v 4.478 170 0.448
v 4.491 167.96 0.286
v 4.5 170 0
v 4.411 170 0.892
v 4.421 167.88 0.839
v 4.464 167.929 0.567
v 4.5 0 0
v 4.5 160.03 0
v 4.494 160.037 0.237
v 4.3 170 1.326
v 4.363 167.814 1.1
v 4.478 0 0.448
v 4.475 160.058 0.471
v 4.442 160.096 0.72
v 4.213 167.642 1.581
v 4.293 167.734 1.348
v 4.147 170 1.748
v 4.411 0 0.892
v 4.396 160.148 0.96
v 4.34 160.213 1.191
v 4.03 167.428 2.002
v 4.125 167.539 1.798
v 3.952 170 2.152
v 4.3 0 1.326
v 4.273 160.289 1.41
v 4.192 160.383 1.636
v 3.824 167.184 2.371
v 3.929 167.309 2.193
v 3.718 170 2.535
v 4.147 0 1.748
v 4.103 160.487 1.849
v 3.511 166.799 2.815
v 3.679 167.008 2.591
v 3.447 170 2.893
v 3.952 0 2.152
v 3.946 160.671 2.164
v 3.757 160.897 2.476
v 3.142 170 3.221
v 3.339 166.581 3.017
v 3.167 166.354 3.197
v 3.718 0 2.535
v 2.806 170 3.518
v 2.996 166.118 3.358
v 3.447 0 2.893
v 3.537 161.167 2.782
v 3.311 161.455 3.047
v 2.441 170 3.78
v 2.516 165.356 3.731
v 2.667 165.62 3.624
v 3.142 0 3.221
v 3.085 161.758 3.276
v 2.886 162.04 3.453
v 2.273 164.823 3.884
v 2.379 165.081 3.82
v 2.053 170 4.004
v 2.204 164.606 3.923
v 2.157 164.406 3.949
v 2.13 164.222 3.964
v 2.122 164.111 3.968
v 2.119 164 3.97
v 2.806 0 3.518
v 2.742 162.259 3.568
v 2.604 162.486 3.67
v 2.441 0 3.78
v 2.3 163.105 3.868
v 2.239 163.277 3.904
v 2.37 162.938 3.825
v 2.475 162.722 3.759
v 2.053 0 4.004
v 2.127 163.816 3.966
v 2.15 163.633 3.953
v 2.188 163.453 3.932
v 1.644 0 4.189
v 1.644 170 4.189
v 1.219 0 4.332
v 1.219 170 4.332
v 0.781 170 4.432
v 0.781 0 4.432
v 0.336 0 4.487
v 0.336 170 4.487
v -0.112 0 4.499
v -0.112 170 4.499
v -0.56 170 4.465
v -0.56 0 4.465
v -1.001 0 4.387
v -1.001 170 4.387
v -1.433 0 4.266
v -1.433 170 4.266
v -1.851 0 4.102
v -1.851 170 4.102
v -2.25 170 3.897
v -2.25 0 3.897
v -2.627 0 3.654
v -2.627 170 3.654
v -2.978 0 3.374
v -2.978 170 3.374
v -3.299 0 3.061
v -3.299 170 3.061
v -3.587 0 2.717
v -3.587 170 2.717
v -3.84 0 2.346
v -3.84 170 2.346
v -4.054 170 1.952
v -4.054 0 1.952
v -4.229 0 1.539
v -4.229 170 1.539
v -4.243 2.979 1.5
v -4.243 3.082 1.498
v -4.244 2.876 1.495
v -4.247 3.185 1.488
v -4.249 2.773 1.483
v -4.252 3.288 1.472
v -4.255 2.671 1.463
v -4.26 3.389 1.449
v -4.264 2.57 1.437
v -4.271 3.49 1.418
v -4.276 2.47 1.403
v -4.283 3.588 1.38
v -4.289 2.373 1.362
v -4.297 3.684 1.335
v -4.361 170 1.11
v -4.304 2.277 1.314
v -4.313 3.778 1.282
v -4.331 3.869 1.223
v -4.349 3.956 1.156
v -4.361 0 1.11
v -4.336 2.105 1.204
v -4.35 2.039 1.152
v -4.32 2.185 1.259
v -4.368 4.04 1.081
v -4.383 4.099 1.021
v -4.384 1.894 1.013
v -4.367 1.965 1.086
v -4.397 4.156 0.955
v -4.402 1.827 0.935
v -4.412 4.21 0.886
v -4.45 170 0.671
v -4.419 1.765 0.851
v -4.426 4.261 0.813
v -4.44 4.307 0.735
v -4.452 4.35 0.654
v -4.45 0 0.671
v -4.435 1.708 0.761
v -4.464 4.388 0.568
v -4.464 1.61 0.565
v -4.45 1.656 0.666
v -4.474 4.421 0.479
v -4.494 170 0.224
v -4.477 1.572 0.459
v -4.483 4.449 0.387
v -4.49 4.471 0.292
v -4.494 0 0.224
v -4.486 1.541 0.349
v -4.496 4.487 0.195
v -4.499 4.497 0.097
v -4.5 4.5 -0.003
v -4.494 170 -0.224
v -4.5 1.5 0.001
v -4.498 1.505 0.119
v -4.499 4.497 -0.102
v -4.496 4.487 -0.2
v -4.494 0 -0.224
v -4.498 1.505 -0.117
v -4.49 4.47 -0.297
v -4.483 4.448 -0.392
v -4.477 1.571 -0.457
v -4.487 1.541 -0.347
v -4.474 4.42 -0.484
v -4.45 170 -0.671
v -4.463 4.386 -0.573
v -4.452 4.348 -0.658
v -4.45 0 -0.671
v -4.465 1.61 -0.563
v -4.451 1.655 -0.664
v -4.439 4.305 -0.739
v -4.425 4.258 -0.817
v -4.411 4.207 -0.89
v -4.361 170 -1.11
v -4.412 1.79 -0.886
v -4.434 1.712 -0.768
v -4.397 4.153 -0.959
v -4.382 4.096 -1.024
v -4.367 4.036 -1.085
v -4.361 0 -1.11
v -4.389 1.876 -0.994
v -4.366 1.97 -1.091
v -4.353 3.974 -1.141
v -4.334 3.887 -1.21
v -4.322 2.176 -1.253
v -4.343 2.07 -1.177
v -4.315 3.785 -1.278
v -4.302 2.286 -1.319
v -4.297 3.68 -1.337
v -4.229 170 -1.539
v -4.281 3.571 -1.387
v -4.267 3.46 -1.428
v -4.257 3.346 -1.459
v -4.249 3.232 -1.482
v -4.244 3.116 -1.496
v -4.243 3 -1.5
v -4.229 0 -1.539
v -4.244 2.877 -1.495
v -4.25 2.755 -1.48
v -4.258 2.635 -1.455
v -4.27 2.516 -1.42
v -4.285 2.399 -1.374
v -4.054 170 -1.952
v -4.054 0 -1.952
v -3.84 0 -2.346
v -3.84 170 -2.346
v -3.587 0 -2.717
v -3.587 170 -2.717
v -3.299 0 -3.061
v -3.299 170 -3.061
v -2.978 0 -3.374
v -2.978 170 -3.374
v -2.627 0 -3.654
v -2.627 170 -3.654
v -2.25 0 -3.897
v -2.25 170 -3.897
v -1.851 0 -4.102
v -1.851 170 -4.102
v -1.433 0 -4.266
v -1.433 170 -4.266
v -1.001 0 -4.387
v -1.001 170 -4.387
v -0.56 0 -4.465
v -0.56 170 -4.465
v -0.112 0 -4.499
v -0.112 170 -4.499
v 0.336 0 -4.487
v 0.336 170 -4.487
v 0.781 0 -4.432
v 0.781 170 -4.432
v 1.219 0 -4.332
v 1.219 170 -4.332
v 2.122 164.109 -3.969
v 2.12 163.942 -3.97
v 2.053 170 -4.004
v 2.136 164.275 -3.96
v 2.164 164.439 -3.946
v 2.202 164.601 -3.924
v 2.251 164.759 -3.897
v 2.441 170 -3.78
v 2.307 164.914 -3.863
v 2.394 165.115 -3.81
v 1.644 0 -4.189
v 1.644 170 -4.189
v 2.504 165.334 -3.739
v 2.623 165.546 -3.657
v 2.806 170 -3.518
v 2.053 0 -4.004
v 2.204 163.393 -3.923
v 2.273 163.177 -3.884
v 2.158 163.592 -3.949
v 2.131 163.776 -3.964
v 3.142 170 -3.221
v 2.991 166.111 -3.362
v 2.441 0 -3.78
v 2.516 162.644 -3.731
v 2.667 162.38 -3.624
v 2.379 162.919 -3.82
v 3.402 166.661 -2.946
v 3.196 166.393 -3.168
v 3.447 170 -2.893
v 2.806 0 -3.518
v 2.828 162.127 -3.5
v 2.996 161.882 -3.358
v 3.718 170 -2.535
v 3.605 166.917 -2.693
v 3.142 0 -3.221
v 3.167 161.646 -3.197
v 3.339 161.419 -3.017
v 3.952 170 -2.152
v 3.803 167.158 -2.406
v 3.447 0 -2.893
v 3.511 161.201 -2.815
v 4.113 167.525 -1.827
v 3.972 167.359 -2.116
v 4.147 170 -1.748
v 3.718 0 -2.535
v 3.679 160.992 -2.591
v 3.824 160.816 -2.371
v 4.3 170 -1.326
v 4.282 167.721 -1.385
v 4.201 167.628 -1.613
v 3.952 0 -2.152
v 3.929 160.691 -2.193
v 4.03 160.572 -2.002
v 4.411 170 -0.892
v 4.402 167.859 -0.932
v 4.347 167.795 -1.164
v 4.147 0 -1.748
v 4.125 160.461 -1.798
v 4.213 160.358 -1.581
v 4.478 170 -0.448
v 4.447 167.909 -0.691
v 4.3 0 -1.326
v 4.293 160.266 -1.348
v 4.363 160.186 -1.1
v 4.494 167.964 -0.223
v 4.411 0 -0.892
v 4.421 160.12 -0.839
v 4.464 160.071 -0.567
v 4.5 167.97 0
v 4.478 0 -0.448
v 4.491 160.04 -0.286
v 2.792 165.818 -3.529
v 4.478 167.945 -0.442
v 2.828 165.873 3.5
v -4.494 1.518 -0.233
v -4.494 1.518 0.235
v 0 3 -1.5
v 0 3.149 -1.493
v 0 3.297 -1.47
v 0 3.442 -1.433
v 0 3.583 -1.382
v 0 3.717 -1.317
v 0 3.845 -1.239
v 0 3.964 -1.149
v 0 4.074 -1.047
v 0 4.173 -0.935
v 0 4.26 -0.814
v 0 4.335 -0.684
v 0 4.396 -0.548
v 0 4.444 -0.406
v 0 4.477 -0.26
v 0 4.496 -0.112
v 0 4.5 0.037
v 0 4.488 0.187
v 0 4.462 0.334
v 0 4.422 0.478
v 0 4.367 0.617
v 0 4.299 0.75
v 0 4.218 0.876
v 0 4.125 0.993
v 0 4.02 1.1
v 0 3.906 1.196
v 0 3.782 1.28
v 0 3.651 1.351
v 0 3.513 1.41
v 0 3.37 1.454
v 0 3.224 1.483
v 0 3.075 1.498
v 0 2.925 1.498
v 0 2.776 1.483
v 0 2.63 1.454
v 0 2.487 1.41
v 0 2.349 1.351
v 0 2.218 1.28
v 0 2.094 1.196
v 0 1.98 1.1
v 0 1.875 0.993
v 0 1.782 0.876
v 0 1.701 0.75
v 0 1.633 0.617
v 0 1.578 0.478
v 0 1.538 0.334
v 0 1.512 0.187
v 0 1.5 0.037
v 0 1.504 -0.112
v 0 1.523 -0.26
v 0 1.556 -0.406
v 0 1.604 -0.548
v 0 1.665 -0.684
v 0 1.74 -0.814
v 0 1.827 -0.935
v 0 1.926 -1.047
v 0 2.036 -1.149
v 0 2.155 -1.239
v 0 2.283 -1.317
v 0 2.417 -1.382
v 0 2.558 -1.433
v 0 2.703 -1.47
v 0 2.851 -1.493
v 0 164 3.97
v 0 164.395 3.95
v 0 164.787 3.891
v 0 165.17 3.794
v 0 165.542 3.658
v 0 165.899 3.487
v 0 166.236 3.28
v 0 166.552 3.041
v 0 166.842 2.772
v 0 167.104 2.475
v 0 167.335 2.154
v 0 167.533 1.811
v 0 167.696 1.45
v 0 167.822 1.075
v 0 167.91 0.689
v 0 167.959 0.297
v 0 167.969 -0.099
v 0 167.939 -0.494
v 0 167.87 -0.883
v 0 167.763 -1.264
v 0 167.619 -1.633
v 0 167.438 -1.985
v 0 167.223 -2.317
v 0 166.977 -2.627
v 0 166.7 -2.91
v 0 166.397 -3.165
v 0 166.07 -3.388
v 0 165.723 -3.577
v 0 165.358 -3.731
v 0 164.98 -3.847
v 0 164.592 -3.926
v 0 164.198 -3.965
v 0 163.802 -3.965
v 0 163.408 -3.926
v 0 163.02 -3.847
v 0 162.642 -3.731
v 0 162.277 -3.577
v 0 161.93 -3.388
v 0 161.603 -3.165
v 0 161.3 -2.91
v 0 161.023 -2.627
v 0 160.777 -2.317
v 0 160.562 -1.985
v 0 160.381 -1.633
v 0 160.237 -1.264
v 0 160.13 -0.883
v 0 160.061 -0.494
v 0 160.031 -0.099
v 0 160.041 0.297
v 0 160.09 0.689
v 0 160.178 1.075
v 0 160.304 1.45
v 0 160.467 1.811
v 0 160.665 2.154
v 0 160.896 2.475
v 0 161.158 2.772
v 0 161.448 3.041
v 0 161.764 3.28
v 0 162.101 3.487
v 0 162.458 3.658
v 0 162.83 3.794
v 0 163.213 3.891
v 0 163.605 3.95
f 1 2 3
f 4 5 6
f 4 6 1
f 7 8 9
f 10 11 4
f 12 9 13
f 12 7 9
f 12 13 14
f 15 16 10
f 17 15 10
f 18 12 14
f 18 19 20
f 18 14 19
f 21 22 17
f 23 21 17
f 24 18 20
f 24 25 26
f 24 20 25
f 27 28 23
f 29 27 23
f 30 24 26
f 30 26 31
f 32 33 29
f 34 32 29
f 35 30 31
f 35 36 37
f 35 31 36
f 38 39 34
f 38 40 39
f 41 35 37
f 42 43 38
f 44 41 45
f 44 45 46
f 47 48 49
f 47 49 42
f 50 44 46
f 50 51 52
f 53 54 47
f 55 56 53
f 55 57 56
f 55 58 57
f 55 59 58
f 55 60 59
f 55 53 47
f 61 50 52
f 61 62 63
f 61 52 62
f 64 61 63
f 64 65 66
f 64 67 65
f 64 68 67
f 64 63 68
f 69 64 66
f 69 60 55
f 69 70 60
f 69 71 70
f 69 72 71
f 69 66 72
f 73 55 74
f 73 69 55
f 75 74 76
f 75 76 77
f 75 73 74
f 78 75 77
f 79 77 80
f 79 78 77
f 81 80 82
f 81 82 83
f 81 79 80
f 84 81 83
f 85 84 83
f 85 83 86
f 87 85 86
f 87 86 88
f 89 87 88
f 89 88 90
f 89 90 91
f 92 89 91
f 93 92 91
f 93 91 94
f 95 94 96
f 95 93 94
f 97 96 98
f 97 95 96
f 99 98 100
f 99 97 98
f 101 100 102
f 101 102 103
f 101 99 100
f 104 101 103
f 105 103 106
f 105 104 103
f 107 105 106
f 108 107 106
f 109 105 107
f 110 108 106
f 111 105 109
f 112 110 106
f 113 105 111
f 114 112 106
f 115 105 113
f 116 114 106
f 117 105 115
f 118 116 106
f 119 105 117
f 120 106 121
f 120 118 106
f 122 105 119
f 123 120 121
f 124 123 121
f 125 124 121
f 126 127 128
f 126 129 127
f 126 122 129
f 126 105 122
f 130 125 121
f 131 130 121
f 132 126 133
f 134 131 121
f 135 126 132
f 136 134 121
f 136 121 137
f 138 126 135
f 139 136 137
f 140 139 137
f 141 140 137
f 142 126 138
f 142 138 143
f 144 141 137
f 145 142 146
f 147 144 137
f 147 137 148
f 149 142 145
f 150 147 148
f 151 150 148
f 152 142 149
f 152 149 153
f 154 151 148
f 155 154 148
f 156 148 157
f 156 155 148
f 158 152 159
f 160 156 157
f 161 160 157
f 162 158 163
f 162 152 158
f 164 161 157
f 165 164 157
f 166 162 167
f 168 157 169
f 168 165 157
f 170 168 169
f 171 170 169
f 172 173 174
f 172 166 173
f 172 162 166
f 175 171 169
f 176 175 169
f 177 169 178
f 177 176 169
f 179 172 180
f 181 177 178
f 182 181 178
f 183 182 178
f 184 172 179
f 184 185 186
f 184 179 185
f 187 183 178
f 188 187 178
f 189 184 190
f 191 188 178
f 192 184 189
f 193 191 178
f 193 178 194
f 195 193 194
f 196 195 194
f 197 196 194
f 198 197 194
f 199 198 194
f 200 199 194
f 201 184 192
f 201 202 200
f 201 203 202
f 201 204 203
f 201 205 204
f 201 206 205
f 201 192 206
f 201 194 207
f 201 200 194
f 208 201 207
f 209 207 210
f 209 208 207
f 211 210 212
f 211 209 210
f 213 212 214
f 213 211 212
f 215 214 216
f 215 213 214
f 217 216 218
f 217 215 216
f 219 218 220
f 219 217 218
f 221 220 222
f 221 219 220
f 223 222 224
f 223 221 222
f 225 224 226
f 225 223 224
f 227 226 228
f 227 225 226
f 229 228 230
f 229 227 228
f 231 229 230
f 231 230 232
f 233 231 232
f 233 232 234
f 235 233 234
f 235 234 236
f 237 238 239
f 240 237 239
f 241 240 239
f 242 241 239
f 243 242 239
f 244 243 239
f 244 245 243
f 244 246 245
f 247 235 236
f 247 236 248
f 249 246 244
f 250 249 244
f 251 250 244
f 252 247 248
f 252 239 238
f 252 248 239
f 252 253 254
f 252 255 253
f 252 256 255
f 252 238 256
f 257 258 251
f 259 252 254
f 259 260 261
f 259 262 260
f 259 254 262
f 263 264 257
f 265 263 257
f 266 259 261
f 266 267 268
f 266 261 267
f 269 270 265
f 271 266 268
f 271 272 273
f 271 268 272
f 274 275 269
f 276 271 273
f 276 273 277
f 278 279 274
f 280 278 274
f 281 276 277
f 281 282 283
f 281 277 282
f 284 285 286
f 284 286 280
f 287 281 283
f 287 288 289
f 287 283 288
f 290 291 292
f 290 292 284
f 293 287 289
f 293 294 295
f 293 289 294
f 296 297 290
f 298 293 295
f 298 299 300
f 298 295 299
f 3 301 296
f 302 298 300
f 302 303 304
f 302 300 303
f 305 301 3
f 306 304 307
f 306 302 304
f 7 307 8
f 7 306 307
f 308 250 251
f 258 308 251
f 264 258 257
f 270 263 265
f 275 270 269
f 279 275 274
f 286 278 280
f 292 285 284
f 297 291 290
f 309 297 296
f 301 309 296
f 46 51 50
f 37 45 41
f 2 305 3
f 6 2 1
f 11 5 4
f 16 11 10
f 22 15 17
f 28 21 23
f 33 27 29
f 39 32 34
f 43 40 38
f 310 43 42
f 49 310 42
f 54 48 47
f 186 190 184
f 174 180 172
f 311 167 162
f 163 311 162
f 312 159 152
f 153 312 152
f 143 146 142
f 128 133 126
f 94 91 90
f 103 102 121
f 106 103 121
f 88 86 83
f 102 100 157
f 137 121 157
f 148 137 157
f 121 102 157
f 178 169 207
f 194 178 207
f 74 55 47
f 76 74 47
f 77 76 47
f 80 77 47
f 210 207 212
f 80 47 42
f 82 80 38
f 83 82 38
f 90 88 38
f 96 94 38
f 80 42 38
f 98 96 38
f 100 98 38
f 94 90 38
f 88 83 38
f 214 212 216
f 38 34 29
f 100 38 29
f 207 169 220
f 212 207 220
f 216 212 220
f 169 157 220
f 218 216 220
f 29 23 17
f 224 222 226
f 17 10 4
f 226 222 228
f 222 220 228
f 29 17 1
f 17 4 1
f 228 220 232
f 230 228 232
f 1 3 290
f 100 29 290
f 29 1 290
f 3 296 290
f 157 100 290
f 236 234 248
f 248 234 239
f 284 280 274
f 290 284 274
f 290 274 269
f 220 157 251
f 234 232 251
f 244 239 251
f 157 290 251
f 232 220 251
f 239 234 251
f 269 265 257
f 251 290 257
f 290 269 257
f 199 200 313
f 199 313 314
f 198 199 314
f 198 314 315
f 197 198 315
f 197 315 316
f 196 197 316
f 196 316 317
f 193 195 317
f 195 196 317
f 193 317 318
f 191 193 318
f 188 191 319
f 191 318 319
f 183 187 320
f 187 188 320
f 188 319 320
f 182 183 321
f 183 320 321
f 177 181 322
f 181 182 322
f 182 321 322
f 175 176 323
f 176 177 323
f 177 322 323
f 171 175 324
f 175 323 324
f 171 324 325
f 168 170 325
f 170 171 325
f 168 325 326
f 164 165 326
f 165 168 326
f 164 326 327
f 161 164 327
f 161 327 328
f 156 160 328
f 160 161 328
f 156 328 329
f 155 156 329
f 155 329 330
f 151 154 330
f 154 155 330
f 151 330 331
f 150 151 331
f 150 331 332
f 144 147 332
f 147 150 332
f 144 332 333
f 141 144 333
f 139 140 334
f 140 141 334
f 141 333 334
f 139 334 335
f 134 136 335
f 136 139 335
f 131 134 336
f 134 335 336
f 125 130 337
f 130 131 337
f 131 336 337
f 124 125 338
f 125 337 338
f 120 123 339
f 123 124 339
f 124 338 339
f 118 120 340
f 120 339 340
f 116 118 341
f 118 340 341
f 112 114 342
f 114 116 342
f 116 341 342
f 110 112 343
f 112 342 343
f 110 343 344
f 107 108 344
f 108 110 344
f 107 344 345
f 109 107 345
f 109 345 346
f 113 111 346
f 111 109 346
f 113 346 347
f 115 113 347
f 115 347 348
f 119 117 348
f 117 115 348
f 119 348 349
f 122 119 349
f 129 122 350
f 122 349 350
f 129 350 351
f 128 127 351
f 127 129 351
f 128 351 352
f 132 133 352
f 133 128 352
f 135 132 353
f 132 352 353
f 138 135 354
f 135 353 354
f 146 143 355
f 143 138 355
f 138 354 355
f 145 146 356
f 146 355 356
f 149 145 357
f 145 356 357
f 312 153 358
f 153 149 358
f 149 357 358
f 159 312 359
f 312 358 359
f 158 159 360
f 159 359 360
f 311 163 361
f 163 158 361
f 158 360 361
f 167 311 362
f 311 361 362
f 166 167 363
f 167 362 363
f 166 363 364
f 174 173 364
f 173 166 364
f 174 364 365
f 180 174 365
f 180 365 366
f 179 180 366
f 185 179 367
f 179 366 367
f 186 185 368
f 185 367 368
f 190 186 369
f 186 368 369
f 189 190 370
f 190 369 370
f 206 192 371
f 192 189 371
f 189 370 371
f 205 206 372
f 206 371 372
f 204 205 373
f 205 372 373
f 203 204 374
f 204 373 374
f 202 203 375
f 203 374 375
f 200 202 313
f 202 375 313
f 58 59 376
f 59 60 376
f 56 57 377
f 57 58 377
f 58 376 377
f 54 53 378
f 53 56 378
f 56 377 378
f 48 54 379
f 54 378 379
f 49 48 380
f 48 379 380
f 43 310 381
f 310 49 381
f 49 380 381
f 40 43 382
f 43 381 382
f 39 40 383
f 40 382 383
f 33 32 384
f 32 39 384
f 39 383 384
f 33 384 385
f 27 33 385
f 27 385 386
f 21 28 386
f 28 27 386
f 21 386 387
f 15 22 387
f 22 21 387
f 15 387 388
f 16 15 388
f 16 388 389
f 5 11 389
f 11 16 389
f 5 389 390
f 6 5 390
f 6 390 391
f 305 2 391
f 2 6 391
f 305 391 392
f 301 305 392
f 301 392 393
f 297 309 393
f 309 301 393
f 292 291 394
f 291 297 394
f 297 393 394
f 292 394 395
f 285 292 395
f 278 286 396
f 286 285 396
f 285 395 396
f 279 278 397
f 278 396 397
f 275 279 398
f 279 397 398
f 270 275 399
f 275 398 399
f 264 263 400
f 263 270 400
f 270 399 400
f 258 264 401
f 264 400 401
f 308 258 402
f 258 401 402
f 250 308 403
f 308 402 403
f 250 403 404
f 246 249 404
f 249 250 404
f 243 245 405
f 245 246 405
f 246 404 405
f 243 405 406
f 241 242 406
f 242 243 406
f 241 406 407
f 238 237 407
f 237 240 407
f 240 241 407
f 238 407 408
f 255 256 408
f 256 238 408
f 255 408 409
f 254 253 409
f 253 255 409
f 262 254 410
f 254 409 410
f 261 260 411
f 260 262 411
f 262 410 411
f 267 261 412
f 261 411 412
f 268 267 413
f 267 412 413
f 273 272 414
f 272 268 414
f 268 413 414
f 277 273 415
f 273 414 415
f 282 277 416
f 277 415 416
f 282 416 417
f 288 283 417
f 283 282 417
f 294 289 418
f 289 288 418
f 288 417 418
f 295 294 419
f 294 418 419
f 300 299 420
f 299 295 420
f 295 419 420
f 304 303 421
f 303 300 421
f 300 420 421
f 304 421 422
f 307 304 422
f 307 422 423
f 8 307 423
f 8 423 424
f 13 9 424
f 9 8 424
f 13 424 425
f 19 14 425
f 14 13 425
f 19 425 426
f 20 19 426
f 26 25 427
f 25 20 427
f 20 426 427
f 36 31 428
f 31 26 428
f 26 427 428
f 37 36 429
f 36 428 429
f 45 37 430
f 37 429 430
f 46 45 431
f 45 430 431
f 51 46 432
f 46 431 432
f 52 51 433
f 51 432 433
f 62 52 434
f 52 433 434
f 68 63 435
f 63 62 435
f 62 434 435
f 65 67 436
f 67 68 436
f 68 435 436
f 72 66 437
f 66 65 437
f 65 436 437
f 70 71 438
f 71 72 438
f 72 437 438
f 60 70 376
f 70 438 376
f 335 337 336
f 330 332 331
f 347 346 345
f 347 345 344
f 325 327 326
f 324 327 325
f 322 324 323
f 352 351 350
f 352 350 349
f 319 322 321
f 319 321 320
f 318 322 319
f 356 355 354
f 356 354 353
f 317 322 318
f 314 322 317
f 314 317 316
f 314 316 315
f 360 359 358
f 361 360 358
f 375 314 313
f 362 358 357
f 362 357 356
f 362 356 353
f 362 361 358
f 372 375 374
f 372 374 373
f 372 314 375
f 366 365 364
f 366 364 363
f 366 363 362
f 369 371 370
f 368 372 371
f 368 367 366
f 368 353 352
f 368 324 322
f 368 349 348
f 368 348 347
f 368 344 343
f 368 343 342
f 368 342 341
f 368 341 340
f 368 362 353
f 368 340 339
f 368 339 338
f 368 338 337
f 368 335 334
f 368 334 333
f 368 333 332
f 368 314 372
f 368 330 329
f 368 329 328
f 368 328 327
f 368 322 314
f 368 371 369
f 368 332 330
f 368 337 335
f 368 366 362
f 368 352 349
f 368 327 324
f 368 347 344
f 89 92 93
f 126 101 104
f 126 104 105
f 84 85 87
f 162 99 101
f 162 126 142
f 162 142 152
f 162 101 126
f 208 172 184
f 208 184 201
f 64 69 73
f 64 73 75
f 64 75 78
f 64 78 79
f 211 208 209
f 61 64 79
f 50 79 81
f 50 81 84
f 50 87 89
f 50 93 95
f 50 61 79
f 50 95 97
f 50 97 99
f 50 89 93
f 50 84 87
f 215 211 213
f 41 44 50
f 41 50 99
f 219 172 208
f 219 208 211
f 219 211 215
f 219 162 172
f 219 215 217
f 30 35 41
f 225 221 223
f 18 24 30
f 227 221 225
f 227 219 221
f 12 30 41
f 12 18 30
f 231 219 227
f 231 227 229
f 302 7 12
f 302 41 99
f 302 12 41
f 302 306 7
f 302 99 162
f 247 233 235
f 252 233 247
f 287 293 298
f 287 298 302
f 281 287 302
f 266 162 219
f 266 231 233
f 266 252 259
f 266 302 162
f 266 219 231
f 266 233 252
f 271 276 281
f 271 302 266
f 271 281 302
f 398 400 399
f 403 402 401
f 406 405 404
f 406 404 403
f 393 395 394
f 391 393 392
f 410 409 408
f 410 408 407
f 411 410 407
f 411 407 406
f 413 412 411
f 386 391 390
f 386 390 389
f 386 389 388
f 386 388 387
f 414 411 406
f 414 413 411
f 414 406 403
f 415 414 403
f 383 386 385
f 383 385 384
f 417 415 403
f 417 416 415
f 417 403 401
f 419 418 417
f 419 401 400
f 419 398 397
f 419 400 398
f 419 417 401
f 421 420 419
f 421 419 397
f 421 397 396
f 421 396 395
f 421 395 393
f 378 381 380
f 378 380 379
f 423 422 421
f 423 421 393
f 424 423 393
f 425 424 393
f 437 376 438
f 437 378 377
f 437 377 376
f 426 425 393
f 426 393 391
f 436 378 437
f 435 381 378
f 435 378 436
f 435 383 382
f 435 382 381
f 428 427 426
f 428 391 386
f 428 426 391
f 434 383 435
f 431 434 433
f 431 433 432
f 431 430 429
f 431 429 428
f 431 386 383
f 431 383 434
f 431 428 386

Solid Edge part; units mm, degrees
sketch "Sketch1" plane through (0, 0, 0) normal (0, -1, 0) x (1, 0, 0)
  circle A0 centre (0, 0) radius 4.5
  dimension "D1" = 9
extrude "Protrusion1" add sketch "Sketch1" against normal blind 170
hole "Hole_1" at (0, 3, 0) direction (-1, 0, 0) diameter 3 end up to next
hole "Hole_4" at (0, 164, 0) direction (1, 0, 0) diameter 7.94 end up to next
